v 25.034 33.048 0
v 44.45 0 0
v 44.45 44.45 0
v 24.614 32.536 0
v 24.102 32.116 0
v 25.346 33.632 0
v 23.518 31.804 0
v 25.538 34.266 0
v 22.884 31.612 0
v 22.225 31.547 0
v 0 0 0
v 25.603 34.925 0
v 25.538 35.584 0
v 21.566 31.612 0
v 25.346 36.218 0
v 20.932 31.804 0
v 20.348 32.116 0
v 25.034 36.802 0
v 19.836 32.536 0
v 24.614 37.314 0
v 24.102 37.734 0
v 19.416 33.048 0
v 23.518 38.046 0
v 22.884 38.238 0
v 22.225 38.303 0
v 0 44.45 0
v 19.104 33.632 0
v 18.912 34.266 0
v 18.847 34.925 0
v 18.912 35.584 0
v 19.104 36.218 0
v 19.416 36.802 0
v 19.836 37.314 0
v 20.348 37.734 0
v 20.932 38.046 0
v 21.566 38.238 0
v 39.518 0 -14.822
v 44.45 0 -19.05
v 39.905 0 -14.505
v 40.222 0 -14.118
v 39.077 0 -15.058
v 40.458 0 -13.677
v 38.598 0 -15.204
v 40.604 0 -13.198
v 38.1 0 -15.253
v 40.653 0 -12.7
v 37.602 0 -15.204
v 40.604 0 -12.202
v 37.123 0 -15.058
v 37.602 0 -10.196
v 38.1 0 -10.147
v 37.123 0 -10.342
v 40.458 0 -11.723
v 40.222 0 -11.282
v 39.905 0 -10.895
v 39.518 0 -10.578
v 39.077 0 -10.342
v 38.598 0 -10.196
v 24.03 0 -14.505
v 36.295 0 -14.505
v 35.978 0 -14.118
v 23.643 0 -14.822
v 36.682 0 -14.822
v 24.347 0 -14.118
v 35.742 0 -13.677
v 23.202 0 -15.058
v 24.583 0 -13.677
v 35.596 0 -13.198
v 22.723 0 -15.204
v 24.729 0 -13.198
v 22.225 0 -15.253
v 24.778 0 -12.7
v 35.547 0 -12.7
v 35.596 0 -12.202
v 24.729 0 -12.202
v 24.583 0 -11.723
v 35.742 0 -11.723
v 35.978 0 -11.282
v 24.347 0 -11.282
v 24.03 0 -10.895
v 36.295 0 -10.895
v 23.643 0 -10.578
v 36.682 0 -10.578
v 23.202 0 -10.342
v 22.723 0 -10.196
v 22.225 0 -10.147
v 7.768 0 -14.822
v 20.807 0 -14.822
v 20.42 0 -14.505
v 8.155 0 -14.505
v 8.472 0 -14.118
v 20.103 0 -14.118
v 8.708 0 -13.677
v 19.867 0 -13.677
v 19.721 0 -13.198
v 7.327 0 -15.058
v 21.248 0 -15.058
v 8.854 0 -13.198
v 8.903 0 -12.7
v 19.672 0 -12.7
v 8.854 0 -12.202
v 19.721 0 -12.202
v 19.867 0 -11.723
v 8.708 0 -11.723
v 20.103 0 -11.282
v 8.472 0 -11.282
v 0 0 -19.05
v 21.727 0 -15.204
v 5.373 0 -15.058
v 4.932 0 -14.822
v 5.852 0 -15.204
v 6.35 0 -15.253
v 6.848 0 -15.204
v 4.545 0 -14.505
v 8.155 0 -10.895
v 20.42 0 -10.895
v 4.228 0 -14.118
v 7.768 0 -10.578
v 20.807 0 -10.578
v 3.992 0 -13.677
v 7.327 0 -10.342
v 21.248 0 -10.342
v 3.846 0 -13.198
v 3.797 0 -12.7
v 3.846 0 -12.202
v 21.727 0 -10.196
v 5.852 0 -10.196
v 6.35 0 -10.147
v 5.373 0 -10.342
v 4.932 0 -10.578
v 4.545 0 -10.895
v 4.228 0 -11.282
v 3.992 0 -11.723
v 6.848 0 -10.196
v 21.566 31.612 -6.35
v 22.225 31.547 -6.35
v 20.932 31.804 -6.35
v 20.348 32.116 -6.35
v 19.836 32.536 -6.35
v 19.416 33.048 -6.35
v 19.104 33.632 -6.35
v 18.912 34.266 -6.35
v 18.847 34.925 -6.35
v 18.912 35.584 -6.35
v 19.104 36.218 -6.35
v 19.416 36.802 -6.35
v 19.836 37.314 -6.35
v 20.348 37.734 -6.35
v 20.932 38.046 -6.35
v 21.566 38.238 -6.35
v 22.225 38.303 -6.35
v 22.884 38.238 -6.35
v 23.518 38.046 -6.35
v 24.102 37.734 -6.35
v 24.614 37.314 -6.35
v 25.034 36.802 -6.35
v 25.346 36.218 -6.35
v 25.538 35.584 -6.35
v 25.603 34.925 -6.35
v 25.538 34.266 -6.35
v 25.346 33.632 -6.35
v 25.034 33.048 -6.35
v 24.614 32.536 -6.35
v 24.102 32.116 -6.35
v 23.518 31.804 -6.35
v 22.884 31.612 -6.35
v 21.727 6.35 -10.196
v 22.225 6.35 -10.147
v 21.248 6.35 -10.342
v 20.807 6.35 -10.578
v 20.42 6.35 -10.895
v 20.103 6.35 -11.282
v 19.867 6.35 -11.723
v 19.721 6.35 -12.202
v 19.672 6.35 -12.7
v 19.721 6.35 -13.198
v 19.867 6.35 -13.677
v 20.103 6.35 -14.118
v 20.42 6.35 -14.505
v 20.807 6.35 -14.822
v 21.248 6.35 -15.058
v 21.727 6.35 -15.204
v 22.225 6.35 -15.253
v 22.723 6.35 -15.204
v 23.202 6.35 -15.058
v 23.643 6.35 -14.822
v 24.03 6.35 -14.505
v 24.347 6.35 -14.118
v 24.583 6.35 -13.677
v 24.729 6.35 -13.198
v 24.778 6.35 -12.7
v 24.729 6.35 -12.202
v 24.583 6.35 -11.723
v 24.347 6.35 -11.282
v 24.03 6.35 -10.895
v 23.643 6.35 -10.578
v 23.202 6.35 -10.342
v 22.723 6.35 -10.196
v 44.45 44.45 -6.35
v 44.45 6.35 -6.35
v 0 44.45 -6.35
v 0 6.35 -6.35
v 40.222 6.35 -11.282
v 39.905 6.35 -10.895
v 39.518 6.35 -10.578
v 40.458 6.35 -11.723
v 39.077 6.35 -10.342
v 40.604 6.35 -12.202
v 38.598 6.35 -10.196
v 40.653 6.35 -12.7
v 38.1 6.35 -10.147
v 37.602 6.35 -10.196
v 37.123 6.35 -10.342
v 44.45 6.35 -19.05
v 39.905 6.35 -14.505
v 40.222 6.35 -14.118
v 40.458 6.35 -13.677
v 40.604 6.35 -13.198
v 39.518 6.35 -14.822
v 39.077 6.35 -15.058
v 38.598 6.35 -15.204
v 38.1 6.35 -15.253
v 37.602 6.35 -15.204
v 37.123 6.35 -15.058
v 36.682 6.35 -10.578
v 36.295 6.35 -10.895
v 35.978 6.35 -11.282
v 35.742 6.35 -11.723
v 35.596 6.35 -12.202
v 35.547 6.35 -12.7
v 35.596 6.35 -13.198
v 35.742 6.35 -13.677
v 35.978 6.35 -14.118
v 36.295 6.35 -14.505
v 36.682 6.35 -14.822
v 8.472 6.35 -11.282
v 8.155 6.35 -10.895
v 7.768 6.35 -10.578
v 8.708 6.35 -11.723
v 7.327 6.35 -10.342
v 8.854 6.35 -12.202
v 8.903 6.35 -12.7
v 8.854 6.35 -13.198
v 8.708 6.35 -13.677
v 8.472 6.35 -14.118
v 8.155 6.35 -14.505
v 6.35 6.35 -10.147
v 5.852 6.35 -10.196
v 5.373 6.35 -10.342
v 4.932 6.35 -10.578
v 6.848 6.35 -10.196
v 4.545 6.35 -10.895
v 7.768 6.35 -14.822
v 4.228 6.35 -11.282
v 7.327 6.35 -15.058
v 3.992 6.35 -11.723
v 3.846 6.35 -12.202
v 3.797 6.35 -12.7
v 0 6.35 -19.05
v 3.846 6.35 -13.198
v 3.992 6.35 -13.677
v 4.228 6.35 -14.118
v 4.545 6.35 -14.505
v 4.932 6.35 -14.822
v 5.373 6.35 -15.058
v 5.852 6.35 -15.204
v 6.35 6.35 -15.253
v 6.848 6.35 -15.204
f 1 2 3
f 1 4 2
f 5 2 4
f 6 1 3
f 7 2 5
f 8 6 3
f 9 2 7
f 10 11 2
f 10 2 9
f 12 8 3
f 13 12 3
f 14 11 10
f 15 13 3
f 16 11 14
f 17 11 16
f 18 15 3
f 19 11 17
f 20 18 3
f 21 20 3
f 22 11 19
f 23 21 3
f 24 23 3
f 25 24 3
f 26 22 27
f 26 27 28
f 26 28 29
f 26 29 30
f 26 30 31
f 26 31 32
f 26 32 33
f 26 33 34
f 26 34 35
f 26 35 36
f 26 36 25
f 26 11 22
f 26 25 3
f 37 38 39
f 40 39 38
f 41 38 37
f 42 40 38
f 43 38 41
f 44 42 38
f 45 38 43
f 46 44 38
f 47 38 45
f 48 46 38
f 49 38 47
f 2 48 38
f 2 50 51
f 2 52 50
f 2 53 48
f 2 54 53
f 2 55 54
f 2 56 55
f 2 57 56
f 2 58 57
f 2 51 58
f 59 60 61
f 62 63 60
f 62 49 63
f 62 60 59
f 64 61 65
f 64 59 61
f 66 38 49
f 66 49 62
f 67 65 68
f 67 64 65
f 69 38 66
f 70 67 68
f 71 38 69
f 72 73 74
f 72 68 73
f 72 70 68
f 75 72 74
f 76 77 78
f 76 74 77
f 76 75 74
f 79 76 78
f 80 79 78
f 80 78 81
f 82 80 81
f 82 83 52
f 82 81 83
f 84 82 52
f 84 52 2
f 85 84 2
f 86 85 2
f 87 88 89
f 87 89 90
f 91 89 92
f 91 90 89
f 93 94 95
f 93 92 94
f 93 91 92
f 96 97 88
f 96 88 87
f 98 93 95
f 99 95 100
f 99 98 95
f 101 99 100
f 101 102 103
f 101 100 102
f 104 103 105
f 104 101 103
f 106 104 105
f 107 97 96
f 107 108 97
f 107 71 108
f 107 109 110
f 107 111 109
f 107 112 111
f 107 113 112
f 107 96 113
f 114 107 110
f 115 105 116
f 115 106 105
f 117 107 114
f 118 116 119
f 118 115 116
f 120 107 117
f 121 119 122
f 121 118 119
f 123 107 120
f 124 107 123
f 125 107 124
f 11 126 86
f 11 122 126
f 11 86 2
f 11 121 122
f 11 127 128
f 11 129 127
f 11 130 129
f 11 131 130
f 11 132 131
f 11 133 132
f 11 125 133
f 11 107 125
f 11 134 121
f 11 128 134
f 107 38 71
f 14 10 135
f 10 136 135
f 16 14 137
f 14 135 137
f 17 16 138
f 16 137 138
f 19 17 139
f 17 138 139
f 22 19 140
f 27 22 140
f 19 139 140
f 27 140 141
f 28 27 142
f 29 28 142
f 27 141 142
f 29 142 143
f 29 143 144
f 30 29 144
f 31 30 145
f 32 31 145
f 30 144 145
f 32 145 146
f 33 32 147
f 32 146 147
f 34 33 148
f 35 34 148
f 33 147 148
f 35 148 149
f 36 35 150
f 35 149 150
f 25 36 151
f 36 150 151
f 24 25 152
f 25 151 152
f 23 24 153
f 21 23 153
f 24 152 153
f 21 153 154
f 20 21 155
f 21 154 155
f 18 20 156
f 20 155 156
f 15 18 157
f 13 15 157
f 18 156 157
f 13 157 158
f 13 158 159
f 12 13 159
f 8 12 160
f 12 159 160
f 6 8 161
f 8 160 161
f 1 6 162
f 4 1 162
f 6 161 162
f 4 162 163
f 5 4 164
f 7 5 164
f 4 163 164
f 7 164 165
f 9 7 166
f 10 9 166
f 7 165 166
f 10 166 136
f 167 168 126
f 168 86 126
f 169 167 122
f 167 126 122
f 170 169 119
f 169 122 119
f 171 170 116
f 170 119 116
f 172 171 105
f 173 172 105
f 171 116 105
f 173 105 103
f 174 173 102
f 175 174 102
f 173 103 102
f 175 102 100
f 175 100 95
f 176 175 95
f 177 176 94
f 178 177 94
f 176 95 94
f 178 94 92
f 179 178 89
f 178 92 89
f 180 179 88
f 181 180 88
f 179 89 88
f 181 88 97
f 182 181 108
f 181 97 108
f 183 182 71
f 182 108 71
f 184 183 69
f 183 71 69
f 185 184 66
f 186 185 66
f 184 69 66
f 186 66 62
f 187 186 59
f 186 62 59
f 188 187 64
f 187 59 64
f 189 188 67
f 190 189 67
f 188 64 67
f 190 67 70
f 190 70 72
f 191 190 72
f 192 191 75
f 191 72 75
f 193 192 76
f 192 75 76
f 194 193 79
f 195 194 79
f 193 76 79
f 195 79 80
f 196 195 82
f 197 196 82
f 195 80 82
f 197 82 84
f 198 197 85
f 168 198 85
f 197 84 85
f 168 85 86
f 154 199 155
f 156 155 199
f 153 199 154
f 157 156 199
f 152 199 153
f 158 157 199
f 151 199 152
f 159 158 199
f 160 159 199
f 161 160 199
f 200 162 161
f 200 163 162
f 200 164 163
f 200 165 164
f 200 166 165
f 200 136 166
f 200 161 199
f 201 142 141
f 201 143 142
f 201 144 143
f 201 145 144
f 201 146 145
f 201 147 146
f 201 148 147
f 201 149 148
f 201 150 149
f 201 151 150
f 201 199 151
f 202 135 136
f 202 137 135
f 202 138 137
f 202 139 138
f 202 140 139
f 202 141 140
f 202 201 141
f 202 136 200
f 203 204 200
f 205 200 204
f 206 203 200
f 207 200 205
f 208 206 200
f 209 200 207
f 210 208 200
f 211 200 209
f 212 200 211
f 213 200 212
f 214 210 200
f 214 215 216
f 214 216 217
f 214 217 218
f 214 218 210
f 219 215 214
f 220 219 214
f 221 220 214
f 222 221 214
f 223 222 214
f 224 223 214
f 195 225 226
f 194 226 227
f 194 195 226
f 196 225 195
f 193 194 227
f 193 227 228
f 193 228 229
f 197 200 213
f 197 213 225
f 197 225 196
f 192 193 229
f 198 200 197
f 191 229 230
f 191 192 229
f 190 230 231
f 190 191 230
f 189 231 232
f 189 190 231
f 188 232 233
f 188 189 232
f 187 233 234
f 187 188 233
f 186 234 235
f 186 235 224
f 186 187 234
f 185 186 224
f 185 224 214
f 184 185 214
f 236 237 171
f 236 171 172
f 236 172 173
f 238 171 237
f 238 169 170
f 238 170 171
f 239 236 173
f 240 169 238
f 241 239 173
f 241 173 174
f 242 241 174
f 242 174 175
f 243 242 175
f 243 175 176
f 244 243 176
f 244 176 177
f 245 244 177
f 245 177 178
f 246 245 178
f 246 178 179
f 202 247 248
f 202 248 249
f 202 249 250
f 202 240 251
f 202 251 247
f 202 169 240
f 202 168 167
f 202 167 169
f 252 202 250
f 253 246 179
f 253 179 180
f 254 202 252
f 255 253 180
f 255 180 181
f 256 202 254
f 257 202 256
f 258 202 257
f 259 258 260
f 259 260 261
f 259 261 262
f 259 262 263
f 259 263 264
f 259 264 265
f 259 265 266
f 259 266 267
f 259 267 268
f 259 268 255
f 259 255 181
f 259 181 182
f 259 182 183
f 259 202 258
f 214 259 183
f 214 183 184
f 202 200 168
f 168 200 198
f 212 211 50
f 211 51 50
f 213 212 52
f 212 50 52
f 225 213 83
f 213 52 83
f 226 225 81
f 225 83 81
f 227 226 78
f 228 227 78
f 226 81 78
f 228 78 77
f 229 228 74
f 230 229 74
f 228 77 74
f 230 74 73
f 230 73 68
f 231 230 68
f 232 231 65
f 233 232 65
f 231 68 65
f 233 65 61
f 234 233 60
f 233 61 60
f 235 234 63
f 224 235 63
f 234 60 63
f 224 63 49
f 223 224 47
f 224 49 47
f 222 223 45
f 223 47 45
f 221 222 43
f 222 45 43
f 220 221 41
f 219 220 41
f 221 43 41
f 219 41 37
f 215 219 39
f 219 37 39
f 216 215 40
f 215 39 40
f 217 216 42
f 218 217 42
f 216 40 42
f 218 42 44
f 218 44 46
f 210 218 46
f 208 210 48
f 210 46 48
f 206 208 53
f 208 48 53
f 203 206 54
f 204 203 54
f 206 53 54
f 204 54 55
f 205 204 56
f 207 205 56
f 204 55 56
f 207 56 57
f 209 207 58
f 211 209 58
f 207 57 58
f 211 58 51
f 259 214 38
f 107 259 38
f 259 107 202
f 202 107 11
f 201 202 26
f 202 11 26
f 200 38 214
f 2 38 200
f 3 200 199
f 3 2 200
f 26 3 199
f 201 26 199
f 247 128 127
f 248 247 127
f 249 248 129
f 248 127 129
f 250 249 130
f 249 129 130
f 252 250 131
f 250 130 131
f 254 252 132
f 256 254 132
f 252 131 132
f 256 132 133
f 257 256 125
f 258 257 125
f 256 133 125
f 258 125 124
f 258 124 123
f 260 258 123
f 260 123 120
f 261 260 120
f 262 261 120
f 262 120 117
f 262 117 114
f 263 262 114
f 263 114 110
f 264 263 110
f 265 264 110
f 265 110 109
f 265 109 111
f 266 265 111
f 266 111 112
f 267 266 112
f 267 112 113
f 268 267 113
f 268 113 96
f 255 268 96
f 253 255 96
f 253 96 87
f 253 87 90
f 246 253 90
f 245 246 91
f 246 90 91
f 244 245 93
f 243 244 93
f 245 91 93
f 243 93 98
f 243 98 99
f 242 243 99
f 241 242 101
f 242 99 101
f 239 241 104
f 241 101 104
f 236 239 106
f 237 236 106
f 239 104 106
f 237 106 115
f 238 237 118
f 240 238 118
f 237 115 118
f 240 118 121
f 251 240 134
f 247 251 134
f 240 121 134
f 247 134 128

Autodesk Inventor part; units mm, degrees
ref_plane "YZ Plane" through (0, 0, 0) normal (1, 0, 0) x (0, 1, 0)
ref_plane "XZ Plane" through (0, 0, 0) normal (0, 1, 0) x (-1, 0, 0)
ref_plane "XY Plane" through (0, 0, 0) normal (0, 0, 1) x (1, 0, 0)
sketch "Sketch1" plane through (0, 0, 0) normal (1, 0, 0) x (0, 1, 0)
  line L0 (0, 0) -> (44.45, 0)
  line L1 (44.45, 0) -> (44.45, -6.35)
  line L2 (44.45, -6.35) -> (6.35, -6.35)
  line L3 (6.35, -6.35) -> (6.35, -19.05)
  line L4 (6.35, -19.05) -> (0, -19.05)
  line L5 (0, -19.05) -> (0, 0)
  dimension "d0" = 6.35
  dimension "d1" = 44.45
  dimension "d21" = 19.05
extrude "Extrusion1" add sketch "Sketch1" along normal blind 44.45
sketch "Sketch2" plane through (0, 0, 0) normal (0, 0, 1) x (1, 0, 0)
  line L0 (0, 44.45) -> (44.45, 44.45) construction
  line L1 (22.225, 44.45) -> (22.225, 0) construction
  line L2 (0, 0) -> (44.45, 0) construction
  point P0 (22.225, 34.925)
  dimension "d4" = 9.525
hole "Hole1" at (22.225, 34.925, 0) direction (0, 0, -1) diameter 6.7564 end through all clearance for "Flat Head Machine Screw (82)" size "1/4" standard "Ansi Unified Screw Threads"
sketch "Sketch4" plane through (0, 6.35, -6.35) normal (0, 1, 0) x (1, 0, 0)
  line L0 (0, 6.35) -> (44.45, 6.35) construction
  line L1 (44.45, -6.35) -> (44.45, 12.7) construction
  line L2 (0, 12.7) -> (44.45, 12.7) projected
  line L3 (0, 0) -> (0, 12.7) projected
  point P0 (0, -6.35)
  point P1 (22.225, 6.35)
  point P2 (6.35, 6.35)
  point P3 (38.1, 6.35)
  dimension "d22" = 6.35
  dimension "d23" = 6.35
  dimension "d24" = 6.35
hole "Hole3" at (22.225, 6.35, -12.7) at (6.35, 6.35, -12.7) at (38.1, 6.35, -12.7) direction (0, -1, 0) diameter 5.1054 end through all clearance for "Flat Head Machine Screw (82)" size "#10" standard "Ansi Unified Screw Threads"
properties part number "AngleBracketForEndOfArm"
